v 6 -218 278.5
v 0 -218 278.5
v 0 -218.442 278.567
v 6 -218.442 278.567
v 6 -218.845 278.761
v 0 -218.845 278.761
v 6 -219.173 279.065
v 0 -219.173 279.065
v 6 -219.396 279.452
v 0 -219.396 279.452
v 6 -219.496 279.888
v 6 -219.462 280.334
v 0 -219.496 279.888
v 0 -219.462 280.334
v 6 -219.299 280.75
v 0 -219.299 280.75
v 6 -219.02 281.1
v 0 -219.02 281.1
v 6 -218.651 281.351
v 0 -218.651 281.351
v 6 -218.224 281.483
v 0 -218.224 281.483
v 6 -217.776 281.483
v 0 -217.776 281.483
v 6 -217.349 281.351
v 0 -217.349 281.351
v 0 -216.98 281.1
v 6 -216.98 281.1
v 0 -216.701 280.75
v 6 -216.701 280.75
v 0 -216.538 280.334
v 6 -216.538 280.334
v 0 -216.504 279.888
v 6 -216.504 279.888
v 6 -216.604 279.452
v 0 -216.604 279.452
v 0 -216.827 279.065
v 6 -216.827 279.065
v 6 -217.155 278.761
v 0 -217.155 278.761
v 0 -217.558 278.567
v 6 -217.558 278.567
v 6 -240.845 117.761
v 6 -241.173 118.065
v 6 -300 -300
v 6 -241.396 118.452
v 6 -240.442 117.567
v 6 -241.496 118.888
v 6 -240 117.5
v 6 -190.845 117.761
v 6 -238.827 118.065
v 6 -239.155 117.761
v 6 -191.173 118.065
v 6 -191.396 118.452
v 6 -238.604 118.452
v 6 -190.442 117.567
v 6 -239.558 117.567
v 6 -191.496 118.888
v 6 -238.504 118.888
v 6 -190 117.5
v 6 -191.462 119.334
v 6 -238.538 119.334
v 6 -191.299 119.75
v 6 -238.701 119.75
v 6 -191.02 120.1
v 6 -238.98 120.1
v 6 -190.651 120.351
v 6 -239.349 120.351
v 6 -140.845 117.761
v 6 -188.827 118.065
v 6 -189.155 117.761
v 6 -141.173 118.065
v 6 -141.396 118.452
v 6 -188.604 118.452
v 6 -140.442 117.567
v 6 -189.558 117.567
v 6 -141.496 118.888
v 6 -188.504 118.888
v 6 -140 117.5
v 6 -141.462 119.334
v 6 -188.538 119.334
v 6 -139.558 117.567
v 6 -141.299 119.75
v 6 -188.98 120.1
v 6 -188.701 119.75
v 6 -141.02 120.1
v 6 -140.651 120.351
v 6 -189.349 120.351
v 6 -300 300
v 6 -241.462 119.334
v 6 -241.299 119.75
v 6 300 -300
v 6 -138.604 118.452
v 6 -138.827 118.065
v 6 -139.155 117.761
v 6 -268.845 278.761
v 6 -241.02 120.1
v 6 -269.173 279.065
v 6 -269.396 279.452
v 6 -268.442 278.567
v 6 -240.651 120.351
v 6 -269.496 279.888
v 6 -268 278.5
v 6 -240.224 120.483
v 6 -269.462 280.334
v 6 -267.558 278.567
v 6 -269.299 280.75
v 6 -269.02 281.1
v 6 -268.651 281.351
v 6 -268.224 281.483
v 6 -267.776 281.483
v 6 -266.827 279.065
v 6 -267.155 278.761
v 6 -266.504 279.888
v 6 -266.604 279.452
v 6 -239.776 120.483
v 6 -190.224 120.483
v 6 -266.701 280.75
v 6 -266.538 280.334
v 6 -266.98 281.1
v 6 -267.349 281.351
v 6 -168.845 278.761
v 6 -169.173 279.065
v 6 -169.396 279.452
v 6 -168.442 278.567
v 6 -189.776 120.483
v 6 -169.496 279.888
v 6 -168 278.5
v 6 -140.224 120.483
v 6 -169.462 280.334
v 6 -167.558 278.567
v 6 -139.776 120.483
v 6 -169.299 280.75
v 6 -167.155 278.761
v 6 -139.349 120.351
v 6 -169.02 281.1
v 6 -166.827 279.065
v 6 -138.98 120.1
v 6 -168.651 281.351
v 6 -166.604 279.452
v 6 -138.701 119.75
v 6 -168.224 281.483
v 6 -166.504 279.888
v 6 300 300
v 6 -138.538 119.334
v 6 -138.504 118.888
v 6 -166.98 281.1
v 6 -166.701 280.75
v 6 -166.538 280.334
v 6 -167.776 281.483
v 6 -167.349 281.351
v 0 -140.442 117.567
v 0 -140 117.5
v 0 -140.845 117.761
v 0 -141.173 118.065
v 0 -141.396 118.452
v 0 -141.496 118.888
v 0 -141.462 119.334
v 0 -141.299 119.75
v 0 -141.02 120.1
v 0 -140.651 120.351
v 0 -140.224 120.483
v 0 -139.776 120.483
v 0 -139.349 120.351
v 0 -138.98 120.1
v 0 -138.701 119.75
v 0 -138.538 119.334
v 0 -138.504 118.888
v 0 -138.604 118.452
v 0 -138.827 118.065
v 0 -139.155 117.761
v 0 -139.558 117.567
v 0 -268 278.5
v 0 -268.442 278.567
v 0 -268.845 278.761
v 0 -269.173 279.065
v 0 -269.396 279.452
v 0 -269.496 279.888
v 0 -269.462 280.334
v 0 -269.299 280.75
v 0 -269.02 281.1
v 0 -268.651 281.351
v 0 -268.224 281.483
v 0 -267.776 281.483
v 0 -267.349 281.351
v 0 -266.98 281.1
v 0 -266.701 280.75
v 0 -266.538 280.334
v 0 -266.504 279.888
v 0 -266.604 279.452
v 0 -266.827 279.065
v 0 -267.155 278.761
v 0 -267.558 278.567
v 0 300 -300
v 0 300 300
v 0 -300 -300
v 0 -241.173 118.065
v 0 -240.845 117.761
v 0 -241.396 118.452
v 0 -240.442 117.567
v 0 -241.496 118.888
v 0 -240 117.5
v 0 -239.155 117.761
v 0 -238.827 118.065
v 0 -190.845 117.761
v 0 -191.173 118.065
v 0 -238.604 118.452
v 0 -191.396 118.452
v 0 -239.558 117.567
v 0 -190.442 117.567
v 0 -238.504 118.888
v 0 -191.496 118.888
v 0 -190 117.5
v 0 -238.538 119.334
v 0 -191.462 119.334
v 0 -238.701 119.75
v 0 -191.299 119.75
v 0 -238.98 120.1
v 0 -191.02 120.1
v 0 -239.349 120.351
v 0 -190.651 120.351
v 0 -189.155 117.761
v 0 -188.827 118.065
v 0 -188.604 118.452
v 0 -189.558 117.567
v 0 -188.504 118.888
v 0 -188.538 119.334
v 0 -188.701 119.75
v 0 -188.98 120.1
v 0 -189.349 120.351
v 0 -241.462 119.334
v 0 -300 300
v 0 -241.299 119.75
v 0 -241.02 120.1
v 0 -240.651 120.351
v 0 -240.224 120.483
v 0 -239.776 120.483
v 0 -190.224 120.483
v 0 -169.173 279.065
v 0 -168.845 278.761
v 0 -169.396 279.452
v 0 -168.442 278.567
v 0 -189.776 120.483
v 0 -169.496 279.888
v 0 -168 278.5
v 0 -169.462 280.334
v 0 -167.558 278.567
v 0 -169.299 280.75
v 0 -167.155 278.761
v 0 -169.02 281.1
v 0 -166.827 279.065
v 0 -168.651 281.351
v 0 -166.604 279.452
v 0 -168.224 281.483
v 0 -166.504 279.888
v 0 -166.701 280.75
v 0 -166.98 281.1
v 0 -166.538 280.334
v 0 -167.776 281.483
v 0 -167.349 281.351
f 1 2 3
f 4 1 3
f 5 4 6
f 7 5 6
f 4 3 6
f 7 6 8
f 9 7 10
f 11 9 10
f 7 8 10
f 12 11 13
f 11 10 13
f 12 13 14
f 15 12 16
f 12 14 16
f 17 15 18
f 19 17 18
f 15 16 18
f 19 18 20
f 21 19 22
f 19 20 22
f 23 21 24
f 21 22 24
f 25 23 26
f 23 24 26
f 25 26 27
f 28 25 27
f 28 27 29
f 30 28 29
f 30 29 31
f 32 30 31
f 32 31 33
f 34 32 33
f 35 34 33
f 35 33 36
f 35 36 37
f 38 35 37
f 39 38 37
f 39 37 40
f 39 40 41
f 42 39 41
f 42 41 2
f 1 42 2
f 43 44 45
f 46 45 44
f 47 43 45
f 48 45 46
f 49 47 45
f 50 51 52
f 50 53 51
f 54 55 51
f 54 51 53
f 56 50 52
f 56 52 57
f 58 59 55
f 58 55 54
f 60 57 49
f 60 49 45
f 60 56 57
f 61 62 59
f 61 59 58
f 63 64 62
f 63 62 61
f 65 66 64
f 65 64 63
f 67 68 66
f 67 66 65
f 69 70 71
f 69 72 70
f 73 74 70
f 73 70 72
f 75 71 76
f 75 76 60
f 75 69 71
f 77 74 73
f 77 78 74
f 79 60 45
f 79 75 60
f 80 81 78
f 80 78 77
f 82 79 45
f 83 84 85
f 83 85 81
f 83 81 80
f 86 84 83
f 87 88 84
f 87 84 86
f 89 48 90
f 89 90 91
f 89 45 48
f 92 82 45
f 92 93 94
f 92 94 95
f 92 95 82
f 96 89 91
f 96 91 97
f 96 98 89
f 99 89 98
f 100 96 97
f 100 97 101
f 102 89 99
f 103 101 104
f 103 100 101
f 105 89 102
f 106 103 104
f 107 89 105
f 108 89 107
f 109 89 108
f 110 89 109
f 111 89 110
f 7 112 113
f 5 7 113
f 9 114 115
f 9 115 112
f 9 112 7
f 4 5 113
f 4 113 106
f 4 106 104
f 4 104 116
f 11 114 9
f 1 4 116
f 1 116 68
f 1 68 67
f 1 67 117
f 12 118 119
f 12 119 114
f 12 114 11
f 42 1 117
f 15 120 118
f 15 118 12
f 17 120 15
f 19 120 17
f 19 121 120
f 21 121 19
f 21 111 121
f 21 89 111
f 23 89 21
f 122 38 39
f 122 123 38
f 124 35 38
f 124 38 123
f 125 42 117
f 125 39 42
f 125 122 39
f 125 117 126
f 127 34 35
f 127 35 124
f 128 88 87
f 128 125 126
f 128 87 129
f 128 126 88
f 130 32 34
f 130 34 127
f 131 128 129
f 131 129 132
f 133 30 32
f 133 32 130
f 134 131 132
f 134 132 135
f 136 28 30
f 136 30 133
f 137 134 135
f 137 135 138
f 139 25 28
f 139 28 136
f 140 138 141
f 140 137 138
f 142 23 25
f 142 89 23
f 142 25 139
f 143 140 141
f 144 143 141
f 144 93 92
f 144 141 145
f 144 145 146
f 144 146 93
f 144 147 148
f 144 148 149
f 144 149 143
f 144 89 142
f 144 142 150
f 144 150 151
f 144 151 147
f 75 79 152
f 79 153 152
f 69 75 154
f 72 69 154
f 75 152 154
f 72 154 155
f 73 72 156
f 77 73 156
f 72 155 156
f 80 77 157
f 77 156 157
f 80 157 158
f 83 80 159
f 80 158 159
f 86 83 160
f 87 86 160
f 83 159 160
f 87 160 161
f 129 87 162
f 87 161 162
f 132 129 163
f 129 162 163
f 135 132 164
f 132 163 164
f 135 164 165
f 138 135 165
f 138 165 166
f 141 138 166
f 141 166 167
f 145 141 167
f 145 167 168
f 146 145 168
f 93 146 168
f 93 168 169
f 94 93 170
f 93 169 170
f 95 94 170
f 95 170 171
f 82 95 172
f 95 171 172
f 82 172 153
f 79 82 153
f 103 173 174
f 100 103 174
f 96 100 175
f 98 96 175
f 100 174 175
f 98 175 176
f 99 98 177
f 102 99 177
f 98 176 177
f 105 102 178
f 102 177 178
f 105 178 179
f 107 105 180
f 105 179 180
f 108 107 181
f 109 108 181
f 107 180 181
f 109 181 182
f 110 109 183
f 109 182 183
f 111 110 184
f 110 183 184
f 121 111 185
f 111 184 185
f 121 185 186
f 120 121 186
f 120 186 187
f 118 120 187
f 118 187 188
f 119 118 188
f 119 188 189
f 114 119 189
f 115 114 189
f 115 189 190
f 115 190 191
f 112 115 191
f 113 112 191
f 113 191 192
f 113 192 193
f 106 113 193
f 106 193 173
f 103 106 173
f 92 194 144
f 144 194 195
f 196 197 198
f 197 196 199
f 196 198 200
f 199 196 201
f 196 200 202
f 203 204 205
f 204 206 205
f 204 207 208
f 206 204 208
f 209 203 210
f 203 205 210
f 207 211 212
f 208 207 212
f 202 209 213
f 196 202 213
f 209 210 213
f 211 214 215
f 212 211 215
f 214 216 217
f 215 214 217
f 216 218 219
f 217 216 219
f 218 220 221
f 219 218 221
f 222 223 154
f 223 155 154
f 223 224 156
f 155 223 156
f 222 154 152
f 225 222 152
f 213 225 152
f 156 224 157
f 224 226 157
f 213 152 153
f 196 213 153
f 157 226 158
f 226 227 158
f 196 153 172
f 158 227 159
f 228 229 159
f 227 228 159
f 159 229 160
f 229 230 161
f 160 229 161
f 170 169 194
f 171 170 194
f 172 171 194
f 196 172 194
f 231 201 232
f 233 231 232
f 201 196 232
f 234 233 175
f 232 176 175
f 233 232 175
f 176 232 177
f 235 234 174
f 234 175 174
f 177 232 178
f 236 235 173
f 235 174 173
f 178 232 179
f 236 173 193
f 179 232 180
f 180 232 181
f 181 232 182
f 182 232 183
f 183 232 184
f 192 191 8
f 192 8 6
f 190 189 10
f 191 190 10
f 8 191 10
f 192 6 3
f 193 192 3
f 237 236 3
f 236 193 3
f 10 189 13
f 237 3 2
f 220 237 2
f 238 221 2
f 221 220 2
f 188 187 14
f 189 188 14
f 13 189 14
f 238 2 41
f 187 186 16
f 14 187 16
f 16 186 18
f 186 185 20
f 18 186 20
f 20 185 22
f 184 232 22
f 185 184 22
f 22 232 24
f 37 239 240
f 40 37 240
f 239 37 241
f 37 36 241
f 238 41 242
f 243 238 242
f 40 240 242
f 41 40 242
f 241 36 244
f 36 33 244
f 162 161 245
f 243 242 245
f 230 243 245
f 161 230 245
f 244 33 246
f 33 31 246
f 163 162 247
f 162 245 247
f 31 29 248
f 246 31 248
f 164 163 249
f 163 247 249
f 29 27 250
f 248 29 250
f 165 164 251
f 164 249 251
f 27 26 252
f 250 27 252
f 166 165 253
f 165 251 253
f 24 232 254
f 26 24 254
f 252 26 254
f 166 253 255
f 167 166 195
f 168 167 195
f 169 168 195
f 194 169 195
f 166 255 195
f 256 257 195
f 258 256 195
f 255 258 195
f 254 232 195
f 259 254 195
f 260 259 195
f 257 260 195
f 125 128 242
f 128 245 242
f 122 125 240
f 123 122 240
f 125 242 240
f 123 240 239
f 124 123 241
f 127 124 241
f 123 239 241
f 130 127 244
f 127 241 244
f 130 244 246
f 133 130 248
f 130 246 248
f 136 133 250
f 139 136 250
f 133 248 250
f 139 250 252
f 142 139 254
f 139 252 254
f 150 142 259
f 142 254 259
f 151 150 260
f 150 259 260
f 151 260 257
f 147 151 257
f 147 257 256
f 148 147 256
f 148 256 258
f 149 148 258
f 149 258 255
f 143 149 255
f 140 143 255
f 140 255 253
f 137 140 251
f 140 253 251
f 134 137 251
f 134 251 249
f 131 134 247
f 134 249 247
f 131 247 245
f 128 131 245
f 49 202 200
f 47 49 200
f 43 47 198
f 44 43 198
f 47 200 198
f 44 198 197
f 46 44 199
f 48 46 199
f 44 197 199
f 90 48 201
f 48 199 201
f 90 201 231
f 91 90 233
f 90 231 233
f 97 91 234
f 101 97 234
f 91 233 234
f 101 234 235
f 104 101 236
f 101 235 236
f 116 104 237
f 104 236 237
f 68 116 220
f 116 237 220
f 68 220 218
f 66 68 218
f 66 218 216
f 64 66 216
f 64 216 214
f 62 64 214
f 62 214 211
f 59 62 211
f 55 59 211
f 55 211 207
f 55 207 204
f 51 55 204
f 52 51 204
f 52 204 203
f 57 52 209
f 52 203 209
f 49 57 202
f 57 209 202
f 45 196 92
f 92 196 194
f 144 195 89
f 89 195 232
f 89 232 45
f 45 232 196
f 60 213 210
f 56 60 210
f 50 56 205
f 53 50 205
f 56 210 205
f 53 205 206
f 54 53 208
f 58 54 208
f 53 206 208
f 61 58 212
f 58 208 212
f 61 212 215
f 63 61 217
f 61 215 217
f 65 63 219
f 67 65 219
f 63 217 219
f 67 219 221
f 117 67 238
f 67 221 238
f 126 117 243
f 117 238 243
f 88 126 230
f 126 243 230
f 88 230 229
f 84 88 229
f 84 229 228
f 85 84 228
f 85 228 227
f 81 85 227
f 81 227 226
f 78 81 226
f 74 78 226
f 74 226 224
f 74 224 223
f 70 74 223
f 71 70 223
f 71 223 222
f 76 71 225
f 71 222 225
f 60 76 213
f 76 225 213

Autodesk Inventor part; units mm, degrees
ref_plane "YZ Plane" through (0, 0, 0) normal (1, 0, 0) x (0, 1, 0)
ref_plane "XZ Plane" through (0, 0, 0) normal (0, 1, 0) x (-1, 0, 0)
ref_plane "XY Plane" through (0, 0, 0) normal (0, 0, 1) x (1, 0, 0)
sketch "Sketch2" plane through (0, 0, 0) normal (1, 0, 0) x (0, 1, 0)
  line L0 (-300, -300) -> (300, -300)
  line L1 (300, -300) -> (300, 300)
  line L2 (300, 300) -> (-300, 300)
  line L3 (-300, 300) -> (-300, -300)
  line L4 (-300, -300) -> (300, 300) construction
  line L5 (300, -300) -> (-300, 300) construction
  point P0 (0, 0)
  dimension "d0" = 600
  dimension "d1" = 600
extrude "Extrusion1" add sketch "Sketch2" along normal blind 6
sketch "Sketch3" plane through (6, 0, 0) normal (1, 0, 0) x (0, 0, -1)
  line L0 (0, 0) -> (-280, 0) construction
  line L1 (-280, 0) -> (-280, -268) construction
  line L2 (-119, 0) -> (-119, -268) construction
  line L3 (-119, -268) -> (-280, -268) construction
  line L4 (-280, -240) -> (-119, -240) construction
  line L5 (-284.5, -274) -> (-114.5, -274) construction
  line L6 (-114.5, -274) -> (-114.5, -234) construction
  line L7 (-114.5, -234) -> (-284.5, -234) construction
  line L8 (-284.5, -234) -> (-284.5, -274) construction
  line L9 (-199.5, -274) -> (-199.5, -268) construction
  line L10 (-199.5, -240) -> (-199.5, -234) construction
  dimension "d13" = 161
  dimension "d14" = 28
  dimension "d15" = 240
  dimension "d16" = 280
  dimension "d17" = 40
  dimension "d18" = 170
hole "Hole1" at (6, -268, 280) at (6, -240, 119) direction (-1, 0, 0) diameter 3 end through all
pattern_linear "Rectangular Pattern1" count 3 spacing 50 along (0, 1, 0) of "Hole1"
properties part number "RT_FRM_MC_009_ElectricalBackPlate_Inside"
